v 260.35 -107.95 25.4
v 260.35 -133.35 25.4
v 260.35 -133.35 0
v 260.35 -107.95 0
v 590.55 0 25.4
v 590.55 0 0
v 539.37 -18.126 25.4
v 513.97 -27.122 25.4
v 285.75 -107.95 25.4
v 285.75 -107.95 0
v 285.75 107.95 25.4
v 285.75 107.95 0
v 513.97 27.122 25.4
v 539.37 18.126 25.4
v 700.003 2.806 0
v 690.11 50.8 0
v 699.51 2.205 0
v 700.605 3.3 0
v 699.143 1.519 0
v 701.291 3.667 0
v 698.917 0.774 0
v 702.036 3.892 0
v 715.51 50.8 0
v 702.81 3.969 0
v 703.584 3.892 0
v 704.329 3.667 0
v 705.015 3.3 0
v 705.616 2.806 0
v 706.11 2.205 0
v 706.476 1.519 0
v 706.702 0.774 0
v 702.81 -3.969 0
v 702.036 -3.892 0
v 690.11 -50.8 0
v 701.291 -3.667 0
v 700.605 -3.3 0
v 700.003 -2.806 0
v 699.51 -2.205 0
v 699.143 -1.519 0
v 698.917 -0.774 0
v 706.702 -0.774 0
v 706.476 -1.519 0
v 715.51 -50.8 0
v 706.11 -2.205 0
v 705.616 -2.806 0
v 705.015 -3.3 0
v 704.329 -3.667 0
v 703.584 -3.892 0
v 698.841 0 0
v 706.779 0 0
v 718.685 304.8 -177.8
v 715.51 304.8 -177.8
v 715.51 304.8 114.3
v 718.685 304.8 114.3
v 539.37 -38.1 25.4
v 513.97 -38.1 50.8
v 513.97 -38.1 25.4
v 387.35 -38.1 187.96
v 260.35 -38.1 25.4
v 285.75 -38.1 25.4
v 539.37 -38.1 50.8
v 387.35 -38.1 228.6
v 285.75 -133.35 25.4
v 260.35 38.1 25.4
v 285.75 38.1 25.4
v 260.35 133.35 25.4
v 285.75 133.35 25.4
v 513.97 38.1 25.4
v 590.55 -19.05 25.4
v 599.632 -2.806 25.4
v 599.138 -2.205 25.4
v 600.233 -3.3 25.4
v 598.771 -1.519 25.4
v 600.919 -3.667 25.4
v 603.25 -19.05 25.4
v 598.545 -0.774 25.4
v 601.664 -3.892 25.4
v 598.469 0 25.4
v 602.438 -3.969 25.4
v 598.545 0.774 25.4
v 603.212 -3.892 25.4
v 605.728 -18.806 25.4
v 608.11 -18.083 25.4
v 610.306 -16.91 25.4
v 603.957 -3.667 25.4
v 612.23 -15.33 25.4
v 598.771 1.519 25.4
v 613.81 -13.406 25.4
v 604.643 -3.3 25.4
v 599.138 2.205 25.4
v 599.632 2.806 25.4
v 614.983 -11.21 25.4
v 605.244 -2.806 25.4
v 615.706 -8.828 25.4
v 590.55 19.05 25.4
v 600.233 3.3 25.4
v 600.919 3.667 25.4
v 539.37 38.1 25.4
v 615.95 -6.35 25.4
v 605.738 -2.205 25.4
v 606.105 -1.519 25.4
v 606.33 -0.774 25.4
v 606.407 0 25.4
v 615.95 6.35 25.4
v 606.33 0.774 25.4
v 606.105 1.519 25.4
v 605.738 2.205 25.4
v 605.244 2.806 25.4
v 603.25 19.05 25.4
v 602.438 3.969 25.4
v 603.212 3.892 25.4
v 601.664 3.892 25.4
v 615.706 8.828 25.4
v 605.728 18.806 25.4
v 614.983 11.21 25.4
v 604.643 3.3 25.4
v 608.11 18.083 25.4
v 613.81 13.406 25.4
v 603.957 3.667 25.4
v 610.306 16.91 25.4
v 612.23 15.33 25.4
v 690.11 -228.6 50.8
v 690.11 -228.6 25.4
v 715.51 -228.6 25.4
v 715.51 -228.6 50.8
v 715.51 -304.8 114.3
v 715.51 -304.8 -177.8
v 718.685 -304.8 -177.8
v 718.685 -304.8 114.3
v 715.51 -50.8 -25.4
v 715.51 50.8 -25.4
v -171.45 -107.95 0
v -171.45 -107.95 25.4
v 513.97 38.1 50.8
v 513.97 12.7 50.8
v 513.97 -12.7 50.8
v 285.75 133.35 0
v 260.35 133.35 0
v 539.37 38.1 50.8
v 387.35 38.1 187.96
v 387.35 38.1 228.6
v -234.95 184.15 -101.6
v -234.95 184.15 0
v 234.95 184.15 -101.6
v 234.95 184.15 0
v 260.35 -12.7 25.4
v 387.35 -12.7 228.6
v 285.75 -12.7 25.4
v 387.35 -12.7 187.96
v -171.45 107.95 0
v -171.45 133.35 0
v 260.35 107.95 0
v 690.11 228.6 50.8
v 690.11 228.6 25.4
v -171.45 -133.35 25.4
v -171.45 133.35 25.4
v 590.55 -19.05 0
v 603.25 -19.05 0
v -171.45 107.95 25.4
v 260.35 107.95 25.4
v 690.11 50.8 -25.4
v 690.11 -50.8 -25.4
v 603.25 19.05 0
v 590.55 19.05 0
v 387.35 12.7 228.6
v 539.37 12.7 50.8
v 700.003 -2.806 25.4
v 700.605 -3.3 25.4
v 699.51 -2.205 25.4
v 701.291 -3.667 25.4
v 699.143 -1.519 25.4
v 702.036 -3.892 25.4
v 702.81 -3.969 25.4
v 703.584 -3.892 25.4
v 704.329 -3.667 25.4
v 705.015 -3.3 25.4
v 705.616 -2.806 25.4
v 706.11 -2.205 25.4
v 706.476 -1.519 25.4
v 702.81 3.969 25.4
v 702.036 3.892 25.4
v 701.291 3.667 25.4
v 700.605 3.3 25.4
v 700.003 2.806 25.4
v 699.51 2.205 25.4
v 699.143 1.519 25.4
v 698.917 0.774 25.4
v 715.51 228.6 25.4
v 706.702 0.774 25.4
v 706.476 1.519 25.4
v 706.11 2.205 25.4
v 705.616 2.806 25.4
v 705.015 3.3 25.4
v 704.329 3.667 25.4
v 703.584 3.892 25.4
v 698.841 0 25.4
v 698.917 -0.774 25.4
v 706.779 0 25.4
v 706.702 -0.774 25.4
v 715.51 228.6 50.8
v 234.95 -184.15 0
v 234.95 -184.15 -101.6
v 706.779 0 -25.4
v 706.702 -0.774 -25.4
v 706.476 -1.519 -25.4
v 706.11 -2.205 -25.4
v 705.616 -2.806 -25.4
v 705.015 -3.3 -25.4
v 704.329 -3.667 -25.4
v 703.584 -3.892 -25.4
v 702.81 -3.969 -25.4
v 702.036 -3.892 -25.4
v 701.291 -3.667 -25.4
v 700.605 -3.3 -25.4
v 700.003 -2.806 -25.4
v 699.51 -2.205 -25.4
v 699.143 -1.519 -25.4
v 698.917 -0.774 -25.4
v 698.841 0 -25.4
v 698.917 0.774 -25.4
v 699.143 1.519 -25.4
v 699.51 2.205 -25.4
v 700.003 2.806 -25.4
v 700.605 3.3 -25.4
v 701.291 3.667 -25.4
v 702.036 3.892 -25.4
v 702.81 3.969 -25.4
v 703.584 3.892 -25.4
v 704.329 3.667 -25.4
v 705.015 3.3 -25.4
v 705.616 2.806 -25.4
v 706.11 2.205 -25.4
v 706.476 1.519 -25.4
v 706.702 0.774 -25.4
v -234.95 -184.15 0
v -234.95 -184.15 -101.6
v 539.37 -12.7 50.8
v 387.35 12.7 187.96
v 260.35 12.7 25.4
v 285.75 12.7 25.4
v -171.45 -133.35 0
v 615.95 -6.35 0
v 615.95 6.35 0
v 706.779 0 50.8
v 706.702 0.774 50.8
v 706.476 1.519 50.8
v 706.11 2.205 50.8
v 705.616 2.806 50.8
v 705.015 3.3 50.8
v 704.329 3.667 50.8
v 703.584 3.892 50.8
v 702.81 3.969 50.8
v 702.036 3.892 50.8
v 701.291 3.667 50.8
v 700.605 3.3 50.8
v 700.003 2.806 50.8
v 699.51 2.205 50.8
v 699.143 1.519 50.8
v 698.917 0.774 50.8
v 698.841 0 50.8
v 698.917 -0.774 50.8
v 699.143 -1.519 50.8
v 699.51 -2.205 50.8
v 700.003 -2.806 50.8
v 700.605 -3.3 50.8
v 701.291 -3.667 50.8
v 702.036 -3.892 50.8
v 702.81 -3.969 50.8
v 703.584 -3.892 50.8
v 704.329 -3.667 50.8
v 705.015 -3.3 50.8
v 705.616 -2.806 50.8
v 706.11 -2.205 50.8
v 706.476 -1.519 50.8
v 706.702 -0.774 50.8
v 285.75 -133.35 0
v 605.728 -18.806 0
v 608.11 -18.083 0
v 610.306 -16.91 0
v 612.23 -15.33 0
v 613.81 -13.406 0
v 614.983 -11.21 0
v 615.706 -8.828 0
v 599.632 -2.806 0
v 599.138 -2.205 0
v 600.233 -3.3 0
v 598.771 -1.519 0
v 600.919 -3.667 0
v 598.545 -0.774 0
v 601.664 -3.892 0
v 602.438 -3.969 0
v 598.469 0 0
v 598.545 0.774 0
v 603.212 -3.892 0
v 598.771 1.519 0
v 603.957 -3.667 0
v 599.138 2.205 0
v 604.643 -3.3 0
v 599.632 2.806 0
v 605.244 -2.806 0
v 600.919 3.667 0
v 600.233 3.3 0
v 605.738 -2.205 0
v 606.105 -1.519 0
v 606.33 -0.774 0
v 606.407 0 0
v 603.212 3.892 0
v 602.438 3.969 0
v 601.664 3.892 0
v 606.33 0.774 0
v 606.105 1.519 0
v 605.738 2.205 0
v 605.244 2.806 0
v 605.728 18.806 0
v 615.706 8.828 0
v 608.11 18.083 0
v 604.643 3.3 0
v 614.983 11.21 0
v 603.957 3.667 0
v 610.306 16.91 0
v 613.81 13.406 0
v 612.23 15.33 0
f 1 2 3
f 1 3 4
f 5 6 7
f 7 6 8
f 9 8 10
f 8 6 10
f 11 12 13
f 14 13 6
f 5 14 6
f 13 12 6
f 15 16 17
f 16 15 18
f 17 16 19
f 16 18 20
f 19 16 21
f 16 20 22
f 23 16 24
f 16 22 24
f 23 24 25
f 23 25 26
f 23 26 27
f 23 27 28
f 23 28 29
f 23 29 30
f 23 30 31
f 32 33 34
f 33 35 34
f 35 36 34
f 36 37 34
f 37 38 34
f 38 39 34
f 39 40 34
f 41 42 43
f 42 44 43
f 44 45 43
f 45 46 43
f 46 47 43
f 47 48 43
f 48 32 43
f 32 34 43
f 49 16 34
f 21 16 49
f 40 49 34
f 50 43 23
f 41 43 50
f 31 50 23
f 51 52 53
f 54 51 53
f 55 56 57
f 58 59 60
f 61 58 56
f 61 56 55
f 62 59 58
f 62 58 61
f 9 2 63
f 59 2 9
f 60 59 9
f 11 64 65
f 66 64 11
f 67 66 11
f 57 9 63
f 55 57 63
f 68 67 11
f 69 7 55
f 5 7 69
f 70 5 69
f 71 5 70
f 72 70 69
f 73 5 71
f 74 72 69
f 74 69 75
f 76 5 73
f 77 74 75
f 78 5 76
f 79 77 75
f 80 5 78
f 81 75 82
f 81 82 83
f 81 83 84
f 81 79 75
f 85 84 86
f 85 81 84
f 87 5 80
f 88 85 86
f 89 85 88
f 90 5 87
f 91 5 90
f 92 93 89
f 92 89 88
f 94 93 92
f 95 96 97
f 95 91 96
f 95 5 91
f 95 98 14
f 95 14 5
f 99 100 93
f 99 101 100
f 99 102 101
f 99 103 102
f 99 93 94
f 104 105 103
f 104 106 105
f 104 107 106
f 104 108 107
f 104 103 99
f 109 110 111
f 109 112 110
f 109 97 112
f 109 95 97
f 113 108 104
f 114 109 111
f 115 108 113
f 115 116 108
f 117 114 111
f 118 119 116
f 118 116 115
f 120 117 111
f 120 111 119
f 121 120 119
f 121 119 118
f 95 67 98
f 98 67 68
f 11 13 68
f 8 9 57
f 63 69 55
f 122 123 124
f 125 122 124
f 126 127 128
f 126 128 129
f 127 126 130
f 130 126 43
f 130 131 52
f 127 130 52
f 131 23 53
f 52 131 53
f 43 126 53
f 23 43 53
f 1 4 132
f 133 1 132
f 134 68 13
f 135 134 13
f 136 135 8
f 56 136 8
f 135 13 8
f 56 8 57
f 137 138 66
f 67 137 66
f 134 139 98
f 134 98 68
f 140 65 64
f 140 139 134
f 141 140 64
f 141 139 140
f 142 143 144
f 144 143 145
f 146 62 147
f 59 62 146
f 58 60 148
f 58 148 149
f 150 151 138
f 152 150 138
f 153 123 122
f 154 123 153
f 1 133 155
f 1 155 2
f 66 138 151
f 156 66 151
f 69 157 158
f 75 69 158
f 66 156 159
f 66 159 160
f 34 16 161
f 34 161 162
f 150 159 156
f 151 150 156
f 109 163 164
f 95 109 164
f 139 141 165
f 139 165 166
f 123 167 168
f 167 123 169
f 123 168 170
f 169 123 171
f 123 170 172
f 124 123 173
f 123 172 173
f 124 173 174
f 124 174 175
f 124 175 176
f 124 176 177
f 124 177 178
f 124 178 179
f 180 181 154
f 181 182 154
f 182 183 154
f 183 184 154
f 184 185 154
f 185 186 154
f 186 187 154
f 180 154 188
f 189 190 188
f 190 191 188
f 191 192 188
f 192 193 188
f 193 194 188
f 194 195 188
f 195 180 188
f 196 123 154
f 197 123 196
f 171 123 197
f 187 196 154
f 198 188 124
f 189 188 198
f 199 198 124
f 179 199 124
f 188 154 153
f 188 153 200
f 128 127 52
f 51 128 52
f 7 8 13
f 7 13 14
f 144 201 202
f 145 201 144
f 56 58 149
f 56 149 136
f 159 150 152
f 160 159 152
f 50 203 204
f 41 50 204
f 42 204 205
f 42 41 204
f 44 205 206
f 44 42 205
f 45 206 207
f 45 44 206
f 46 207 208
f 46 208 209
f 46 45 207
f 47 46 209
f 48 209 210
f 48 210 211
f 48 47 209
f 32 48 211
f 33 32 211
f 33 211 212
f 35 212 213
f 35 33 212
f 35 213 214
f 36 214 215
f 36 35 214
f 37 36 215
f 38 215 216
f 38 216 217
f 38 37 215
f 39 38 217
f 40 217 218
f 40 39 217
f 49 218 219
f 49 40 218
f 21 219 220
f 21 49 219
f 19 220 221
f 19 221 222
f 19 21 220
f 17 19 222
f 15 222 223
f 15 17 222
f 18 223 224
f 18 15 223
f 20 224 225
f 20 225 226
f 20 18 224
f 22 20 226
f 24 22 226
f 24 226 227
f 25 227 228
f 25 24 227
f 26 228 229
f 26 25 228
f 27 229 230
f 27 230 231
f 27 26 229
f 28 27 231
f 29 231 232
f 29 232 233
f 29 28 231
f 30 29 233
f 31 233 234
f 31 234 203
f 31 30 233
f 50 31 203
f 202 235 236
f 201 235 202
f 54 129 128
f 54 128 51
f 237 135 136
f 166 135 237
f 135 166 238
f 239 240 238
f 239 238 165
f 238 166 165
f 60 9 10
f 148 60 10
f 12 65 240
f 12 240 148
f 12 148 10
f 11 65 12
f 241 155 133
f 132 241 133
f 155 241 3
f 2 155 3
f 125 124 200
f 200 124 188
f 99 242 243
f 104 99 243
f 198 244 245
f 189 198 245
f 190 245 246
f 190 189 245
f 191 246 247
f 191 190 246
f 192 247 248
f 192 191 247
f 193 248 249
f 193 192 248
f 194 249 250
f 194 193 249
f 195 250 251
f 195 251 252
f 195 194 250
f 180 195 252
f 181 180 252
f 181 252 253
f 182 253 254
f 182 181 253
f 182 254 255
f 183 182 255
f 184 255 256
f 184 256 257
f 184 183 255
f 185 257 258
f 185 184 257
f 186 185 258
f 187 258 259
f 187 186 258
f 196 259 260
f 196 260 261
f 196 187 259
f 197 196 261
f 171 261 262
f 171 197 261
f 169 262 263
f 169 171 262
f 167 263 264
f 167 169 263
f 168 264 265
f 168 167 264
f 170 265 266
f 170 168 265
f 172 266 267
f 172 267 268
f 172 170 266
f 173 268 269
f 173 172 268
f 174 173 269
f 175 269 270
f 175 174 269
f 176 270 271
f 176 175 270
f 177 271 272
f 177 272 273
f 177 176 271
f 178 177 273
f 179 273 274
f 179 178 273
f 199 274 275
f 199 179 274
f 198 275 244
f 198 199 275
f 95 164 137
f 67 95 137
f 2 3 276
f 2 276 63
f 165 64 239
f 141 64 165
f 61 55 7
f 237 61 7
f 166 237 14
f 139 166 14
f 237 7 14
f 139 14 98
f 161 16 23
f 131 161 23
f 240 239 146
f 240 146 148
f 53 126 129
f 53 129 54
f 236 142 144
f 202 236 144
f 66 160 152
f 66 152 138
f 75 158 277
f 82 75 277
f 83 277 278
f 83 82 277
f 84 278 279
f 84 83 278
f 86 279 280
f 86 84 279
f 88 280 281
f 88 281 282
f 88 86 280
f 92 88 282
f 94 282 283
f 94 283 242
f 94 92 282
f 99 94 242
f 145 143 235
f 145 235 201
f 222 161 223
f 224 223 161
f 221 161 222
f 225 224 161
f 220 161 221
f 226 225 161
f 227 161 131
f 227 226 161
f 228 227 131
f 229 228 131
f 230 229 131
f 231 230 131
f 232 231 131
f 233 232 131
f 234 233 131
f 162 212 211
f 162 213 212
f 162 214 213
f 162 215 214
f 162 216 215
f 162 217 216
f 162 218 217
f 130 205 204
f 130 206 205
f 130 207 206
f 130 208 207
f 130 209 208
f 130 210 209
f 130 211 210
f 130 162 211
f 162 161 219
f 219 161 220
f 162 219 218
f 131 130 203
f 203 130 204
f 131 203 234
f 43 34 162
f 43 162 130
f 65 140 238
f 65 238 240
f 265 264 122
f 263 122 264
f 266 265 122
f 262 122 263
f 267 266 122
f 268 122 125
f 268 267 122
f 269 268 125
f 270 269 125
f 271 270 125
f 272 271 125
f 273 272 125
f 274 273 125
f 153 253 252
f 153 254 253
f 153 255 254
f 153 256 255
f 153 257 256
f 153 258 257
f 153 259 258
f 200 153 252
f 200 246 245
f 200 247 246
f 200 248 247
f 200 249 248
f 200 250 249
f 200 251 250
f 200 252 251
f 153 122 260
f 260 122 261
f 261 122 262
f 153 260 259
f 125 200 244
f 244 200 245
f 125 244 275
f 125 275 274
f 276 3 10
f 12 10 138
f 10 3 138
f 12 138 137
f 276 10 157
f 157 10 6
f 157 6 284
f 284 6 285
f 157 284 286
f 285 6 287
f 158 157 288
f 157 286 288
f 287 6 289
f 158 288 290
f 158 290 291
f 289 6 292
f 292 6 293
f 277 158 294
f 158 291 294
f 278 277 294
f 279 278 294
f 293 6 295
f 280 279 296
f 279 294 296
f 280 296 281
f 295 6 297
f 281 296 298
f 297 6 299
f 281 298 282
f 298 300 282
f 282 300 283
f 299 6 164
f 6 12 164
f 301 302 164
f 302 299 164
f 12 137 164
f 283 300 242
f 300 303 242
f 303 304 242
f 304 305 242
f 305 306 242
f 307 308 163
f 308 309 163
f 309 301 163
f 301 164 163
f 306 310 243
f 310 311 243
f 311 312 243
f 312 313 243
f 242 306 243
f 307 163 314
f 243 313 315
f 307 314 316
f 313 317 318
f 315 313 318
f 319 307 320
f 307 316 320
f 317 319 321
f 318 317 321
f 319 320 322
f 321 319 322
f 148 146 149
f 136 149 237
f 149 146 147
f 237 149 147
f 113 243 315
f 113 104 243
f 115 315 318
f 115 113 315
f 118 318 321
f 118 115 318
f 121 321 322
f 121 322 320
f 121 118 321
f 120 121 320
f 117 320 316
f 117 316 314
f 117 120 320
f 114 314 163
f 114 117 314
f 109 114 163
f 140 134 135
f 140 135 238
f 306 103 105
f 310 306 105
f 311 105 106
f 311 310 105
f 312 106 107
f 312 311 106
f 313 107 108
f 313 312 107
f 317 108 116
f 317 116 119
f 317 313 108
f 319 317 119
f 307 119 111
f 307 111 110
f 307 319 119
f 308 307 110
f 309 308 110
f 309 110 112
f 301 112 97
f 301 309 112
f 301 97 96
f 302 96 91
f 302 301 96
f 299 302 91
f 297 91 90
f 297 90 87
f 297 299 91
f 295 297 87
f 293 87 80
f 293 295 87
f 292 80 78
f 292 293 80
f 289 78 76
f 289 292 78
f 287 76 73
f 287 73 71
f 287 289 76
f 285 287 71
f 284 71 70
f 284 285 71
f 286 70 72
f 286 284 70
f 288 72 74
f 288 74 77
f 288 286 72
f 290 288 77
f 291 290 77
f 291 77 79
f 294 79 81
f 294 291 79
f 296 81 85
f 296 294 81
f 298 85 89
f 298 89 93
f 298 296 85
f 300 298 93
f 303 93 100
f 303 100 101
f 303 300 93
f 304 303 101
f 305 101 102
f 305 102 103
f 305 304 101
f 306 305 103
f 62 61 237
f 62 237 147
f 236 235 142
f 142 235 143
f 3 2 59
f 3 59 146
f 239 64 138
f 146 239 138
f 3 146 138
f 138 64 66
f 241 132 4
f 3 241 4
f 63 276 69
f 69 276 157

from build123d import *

# Parameters (mm, degrees)
F1_W      = 406.4
F1_H      = 25.4
F1_W_2    = 25.4
F2_DEPTH  = 25.4
F3_W      = 241.3
F3_H      = 25.4
F3_W_2    = 25.4
F4_DEPTH  = 25.4
F0_W      = 469.9
F0_H      = 368.3
F5_DEPTH  = 101.6
F6_R      = 3.96875
F7_DEPTH  = 25.4
F8_W      = 25.4
F8_H      = 457.2
F8_R      = 3.96875
F9_DEPTH  = 25.4
F10_W     = 25.4
F10_H     = 101.6
F10_R     = 3.96875
F11_DEPTH = 25.4
F12_W     = 609.6
F12_H     = 292.1
F12_W_2   = 457.2
F12_H_2   = 25.4
F13_DEPTH = 3.175
F14_R     = 12.7
F16_DEPTH = 25.4
F18_DEPTH = 25.4
F20_DEPTH = 25.4


# Not quite as in the source:
# - a feature names something its author has since deleted; it is built from what else it names


with BuildPart() as f2:
    # F1 (on face) → F2 (new body)
    with BuildSketch(Plane.XY):
        with Locations((31.75, -120.65)):
            Rectangle(F1_W, F1_H)
        with Locations((247.65, -120.65)):
            Rectangle(F1_W_2, F1_H)
    extrude(amount=F2_DEPTH)


with BuildPart() as f2b:
    # F1 (on face) → F2, piece 2 (new body)
    with BuildSketch(Plane.XY):
        with Locations((31.75, 120.65)):
            Rectangle(F1_W, F1_H)
        with Locations((247.65, 120.65)):
            Rectangle(F1_W_2, F1_H)
    extrude(amount=F2_DEPTH)


with BuildPart() as f4:
    # F3 (on face) → F4 (new body)
    with BuildSketch(Plane.YZ.offset(260.35)):
        with Locations((12.7, 12.7)):
            Rectangle(F3_W, F3_H)
        with Locations((-120.65, 12.7)):
            Rectangle(F3_W_2, F3_H)
    extrude(amount=F4_DEPTH)

    # F6 (on face) → F7 (join)
    with BuildSketch(Plane.XY):
        Polygon((285.75, -107.95), (285.75, -133.35), (590.55, -19.05), (590.55, 0), align=None)
        Polygon((590.55, 19.05), (285.75, 133.35), (285.75, 107.95), (590.55, 0), align=None)
        Polygon((615.95, 19.05), (590.55, 19.05), (590.55, 0), (590.55, -19.05), (615.95, -19.05), align=None)
        with Locations((602.4379256336, 0)):
            Circle(F6_R, mode=Mode.SUBTRACT)
    extrude(amount=F7_DEPTH)

    # F14
    f14_edges = [f4.edges().sort_by_distance(p)[0] for p in [
        (615.95, 19.05, 12.7),
        (615.95, -19.05, 12.7),
    ]]
    fillet(f14_edges, radius=F14_R)

    # F15 (on face) → F16 (join)
    with BuildSketch(Plane.XY.offset(25.4)):
        Polygon((539.3700387001, -18.1262362937), (513.9700387001, -27.122069627), (513.9700387001, -38.1), (539.3700387001, -38.1), align=None)
        Polygon((539.3700387001, 18.1262362937), (513.9700387001, 27.122069627), (513.9700387001, -27.122069627), (539.3700387001, -18.1262362937), align=None)
        Polygon((539.3700387001, 38.1), (513.9700387001, 38.1), (513.9700387001, 27.122069627), (539.3700387001, 18.1262362937), align=None)
    extrude(amount=F16_DEPTH)

    # F17 (on face) → F18 (join)
    with BuildSketch(Plane.XZ.offset(38.1)):
        Polygon((260.35, 25.4), (285.75, 25.4), (387.35, 187.96), (513.9700387001, 50.8), (539.3700387001, 50.8), (387.35, 228.6), align=None)
    extrude(amount=-F18_DEPTH)

    # F19 (on face) → F20 (join)
    with BuildSketch(Plane(origin=(0, 38.1, 0), x_dir=(-1, 0, 0), z_dir=(0, 1, 0))):
        Polygon((-539.3700387001, 50.8), (-513.9700387001, 50.8), (-387.35, 187.96), (-285.75, 25.4), (-260.35, 25.4), (-387.35, 228.6), align=None)
    extrude(amount=-F20_DEPTH)


with BuildPart() as f5:
    # F0 (on Top) → F5 (new body)
    with BuildSketch(Plane.XY):
        Rectangle(F0_W, F0_H)
    extrude(amount=-F5_DEPTH)


with BuildPart() as f9:
    # F8 (on face) → F9 (new body)
    with BuildSketch(Plane.XY.offset(25.4)):
        with Locations((702.8098106384, 0)):
            Rectangle(F8_W, F8_H)
        with Locations((702.8098106384, 0)):
            Circle(F8_R, mode=Mode.SUBTRACT)
    extrude(amount=F9_DEPTH)


with BuildPart() as f11:
    # F10 (on face) → F11 (new body)
    with BuildSketch(Plane(origin=(0, 0, 0), x_dir=(1, 0, 0), z_dir=(0, 0, -1))):
        with Locations((702.8098106384, 0)):
            Rectangle(F10_W, F10_H)
        with Locations((702.8098106384, 0)):
            Circle(F10_R, mode=Mode.SUBTRACT)
    extrude(amount=F11_DEPTH)

    # F12 (on face) → F13 (join)
    with BuildSketch(Plane.YZ.offset(715.5098106384)):
        with Locations((0, -31.75)):
            Rectangle(F12_W, F12_H)
        with Locations((0, 38.1)):
            Rectangle(F12_W_2, F12_H_2, mode=Mode.SUBTRACT)
        with Locations((0, 38.1)):
            Rectangle(F12_W_2, F12_H_2)
    extrude(amount=F13_DEPTH)


solid = Compound([f2.part, f2b.part, f4.part, f5.part, f9.part, f11.part])
